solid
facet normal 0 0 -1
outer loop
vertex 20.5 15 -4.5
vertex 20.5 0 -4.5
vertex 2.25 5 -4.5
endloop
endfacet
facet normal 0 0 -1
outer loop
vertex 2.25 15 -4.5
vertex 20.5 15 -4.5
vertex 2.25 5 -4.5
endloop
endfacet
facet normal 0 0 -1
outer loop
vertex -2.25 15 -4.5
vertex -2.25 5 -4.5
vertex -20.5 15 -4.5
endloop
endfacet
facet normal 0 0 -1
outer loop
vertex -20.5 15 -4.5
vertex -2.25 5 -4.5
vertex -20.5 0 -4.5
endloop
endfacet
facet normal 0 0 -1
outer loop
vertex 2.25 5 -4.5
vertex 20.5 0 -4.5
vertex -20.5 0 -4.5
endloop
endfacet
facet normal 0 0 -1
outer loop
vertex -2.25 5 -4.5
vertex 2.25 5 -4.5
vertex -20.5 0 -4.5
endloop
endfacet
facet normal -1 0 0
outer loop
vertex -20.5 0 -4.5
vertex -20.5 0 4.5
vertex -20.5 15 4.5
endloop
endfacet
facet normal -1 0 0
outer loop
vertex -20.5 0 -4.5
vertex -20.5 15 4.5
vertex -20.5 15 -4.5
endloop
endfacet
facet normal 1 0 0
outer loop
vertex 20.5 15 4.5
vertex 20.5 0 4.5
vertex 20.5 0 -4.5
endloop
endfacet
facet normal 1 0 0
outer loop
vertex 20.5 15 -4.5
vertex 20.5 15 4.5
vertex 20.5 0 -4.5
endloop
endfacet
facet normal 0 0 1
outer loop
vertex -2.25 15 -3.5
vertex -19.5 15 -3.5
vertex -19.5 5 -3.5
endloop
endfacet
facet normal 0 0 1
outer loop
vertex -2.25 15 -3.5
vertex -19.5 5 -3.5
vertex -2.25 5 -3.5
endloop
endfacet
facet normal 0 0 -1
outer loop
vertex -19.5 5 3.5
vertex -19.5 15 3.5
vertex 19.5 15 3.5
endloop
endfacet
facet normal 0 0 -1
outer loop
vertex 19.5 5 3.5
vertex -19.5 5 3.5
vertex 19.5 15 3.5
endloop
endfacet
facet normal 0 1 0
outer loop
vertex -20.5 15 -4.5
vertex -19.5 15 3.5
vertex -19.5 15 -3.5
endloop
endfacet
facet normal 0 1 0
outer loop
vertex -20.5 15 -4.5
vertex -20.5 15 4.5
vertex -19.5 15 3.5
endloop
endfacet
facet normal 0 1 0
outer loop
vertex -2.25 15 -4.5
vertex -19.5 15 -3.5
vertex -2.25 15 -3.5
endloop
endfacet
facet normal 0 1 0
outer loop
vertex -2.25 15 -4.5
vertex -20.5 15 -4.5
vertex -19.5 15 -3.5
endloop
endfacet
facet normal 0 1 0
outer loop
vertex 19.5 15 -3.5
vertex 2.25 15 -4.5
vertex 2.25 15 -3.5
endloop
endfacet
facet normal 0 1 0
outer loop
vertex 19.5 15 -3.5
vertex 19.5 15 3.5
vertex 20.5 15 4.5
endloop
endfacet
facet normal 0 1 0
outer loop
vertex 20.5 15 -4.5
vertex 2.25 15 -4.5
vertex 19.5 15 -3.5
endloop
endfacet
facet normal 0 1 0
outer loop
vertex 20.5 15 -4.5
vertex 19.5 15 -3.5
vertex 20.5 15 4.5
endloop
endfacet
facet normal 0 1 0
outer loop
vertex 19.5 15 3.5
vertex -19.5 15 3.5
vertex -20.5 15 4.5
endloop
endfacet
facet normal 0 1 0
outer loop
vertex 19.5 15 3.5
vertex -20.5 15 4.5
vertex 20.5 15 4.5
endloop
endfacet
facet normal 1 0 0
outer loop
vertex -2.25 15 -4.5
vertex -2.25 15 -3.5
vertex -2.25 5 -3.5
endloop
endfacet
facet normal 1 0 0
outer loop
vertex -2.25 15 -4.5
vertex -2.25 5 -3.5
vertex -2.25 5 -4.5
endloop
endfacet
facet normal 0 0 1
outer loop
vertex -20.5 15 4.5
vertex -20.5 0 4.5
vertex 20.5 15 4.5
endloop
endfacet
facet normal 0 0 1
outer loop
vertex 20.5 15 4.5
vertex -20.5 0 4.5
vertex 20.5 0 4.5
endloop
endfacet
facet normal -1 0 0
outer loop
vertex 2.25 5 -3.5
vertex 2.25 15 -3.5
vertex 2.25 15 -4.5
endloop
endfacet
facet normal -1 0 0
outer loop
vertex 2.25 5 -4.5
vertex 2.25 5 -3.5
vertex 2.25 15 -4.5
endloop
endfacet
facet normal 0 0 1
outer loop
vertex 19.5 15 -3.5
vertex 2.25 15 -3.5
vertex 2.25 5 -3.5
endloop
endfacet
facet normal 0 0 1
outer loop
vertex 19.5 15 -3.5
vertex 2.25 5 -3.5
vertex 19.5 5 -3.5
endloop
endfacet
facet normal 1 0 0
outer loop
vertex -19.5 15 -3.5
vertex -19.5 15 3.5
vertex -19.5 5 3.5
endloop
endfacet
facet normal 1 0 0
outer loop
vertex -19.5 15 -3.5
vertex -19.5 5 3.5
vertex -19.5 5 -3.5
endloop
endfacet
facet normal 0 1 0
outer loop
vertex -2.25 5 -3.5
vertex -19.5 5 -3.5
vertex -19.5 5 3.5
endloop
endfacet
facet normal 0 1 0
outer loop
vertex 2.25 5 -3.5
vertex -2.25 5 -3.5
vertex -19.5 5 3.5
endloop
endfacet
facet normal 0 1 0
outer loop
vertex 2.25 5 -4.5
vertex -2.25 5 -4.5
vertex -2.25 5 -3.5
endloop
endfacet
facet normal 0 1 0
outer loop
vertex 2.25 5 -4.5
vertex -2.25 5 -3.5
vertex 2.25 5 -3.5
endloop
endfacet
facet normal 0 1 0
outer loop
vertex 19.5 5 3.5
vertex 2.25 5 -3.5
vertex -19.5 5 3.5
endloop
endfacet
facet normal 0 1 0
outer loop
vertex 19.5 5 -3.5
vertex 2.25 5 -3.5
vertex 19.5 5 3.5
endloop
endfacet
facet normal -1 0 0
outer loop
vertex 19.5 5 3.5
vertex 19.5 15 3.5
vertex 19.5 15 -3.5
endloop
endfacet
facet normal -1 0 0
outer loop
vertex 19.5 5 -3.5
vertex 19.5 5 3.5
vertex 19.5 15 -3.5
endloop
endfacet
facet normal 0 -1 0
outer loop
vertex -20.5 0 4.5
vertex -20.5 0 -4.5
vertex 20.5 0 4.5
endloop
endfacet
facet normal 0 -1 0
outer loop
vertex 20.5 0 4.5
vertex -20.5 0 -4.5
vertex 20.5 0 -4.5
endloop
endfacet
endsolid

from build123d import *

# Parameters (mm, degrees)
SKETCH_486_W        = 4.5
SKETCH_486_H        = 9
SKETCH_486_W_2      = 41
EXTRUDE_840_DEPTH   = 15
CUT_EXTRUDE_START   = 15
SKETCH_4_W          = 39
SKETCH_4_H          = 7
CUT_EXTRUDE_8_DEPTH = 10
SKETCH_5_W          = 4.5
SKETCH_5_H          = 6.901015062
CUT_EXTRUDE_9_DEPTH = 10


with BuildPart() as part:
    # Sketch 486 → Extrude 840 (new body)
    with BuildSketch(Plane(origin=(0, 0, 0), x_dir=(1, 0, 0), z_dir=(0, 1, 0))):
        Rectangle(SKETCH_486_W, SKETCH_486_H)
        Rectangle(SKETCH_486_W_2, SKETCH_486_H)
    extrude(amount=EXTRUDE_840_DEPTH)

    # 草图4 → 切除-拉伸8 (cut)
    with BuildSketch(Plane(origin=(0, 0, 0), x_dir=(1, 0, 0), z_dir=(0, 1, 0)).offset(CUT_EXTRUDE_START)):
        Rectangle(SKETCH_4_W, SKETCH_4_H)
    extrude(amount=-CUT_EXTRUDE_8_DEPTH, mode=Mode.SUBTRACT)

    # 草图5 → 切除-拉伸9 (cut)
    with BuildSketch(Plane(origin=(0, 15, 0), x_dir=(1, 0, 0), z_dir=(0, 1, 0))):
        with Locations((0, 3.450507531)):
            Rectangle(SKETCH_5_W, SKETCH_5_H)
    extrude(amount=-CUT_EXTRUDE_9_DEPTH, mode=Mode.SUBTRACT)


solid = part.part
